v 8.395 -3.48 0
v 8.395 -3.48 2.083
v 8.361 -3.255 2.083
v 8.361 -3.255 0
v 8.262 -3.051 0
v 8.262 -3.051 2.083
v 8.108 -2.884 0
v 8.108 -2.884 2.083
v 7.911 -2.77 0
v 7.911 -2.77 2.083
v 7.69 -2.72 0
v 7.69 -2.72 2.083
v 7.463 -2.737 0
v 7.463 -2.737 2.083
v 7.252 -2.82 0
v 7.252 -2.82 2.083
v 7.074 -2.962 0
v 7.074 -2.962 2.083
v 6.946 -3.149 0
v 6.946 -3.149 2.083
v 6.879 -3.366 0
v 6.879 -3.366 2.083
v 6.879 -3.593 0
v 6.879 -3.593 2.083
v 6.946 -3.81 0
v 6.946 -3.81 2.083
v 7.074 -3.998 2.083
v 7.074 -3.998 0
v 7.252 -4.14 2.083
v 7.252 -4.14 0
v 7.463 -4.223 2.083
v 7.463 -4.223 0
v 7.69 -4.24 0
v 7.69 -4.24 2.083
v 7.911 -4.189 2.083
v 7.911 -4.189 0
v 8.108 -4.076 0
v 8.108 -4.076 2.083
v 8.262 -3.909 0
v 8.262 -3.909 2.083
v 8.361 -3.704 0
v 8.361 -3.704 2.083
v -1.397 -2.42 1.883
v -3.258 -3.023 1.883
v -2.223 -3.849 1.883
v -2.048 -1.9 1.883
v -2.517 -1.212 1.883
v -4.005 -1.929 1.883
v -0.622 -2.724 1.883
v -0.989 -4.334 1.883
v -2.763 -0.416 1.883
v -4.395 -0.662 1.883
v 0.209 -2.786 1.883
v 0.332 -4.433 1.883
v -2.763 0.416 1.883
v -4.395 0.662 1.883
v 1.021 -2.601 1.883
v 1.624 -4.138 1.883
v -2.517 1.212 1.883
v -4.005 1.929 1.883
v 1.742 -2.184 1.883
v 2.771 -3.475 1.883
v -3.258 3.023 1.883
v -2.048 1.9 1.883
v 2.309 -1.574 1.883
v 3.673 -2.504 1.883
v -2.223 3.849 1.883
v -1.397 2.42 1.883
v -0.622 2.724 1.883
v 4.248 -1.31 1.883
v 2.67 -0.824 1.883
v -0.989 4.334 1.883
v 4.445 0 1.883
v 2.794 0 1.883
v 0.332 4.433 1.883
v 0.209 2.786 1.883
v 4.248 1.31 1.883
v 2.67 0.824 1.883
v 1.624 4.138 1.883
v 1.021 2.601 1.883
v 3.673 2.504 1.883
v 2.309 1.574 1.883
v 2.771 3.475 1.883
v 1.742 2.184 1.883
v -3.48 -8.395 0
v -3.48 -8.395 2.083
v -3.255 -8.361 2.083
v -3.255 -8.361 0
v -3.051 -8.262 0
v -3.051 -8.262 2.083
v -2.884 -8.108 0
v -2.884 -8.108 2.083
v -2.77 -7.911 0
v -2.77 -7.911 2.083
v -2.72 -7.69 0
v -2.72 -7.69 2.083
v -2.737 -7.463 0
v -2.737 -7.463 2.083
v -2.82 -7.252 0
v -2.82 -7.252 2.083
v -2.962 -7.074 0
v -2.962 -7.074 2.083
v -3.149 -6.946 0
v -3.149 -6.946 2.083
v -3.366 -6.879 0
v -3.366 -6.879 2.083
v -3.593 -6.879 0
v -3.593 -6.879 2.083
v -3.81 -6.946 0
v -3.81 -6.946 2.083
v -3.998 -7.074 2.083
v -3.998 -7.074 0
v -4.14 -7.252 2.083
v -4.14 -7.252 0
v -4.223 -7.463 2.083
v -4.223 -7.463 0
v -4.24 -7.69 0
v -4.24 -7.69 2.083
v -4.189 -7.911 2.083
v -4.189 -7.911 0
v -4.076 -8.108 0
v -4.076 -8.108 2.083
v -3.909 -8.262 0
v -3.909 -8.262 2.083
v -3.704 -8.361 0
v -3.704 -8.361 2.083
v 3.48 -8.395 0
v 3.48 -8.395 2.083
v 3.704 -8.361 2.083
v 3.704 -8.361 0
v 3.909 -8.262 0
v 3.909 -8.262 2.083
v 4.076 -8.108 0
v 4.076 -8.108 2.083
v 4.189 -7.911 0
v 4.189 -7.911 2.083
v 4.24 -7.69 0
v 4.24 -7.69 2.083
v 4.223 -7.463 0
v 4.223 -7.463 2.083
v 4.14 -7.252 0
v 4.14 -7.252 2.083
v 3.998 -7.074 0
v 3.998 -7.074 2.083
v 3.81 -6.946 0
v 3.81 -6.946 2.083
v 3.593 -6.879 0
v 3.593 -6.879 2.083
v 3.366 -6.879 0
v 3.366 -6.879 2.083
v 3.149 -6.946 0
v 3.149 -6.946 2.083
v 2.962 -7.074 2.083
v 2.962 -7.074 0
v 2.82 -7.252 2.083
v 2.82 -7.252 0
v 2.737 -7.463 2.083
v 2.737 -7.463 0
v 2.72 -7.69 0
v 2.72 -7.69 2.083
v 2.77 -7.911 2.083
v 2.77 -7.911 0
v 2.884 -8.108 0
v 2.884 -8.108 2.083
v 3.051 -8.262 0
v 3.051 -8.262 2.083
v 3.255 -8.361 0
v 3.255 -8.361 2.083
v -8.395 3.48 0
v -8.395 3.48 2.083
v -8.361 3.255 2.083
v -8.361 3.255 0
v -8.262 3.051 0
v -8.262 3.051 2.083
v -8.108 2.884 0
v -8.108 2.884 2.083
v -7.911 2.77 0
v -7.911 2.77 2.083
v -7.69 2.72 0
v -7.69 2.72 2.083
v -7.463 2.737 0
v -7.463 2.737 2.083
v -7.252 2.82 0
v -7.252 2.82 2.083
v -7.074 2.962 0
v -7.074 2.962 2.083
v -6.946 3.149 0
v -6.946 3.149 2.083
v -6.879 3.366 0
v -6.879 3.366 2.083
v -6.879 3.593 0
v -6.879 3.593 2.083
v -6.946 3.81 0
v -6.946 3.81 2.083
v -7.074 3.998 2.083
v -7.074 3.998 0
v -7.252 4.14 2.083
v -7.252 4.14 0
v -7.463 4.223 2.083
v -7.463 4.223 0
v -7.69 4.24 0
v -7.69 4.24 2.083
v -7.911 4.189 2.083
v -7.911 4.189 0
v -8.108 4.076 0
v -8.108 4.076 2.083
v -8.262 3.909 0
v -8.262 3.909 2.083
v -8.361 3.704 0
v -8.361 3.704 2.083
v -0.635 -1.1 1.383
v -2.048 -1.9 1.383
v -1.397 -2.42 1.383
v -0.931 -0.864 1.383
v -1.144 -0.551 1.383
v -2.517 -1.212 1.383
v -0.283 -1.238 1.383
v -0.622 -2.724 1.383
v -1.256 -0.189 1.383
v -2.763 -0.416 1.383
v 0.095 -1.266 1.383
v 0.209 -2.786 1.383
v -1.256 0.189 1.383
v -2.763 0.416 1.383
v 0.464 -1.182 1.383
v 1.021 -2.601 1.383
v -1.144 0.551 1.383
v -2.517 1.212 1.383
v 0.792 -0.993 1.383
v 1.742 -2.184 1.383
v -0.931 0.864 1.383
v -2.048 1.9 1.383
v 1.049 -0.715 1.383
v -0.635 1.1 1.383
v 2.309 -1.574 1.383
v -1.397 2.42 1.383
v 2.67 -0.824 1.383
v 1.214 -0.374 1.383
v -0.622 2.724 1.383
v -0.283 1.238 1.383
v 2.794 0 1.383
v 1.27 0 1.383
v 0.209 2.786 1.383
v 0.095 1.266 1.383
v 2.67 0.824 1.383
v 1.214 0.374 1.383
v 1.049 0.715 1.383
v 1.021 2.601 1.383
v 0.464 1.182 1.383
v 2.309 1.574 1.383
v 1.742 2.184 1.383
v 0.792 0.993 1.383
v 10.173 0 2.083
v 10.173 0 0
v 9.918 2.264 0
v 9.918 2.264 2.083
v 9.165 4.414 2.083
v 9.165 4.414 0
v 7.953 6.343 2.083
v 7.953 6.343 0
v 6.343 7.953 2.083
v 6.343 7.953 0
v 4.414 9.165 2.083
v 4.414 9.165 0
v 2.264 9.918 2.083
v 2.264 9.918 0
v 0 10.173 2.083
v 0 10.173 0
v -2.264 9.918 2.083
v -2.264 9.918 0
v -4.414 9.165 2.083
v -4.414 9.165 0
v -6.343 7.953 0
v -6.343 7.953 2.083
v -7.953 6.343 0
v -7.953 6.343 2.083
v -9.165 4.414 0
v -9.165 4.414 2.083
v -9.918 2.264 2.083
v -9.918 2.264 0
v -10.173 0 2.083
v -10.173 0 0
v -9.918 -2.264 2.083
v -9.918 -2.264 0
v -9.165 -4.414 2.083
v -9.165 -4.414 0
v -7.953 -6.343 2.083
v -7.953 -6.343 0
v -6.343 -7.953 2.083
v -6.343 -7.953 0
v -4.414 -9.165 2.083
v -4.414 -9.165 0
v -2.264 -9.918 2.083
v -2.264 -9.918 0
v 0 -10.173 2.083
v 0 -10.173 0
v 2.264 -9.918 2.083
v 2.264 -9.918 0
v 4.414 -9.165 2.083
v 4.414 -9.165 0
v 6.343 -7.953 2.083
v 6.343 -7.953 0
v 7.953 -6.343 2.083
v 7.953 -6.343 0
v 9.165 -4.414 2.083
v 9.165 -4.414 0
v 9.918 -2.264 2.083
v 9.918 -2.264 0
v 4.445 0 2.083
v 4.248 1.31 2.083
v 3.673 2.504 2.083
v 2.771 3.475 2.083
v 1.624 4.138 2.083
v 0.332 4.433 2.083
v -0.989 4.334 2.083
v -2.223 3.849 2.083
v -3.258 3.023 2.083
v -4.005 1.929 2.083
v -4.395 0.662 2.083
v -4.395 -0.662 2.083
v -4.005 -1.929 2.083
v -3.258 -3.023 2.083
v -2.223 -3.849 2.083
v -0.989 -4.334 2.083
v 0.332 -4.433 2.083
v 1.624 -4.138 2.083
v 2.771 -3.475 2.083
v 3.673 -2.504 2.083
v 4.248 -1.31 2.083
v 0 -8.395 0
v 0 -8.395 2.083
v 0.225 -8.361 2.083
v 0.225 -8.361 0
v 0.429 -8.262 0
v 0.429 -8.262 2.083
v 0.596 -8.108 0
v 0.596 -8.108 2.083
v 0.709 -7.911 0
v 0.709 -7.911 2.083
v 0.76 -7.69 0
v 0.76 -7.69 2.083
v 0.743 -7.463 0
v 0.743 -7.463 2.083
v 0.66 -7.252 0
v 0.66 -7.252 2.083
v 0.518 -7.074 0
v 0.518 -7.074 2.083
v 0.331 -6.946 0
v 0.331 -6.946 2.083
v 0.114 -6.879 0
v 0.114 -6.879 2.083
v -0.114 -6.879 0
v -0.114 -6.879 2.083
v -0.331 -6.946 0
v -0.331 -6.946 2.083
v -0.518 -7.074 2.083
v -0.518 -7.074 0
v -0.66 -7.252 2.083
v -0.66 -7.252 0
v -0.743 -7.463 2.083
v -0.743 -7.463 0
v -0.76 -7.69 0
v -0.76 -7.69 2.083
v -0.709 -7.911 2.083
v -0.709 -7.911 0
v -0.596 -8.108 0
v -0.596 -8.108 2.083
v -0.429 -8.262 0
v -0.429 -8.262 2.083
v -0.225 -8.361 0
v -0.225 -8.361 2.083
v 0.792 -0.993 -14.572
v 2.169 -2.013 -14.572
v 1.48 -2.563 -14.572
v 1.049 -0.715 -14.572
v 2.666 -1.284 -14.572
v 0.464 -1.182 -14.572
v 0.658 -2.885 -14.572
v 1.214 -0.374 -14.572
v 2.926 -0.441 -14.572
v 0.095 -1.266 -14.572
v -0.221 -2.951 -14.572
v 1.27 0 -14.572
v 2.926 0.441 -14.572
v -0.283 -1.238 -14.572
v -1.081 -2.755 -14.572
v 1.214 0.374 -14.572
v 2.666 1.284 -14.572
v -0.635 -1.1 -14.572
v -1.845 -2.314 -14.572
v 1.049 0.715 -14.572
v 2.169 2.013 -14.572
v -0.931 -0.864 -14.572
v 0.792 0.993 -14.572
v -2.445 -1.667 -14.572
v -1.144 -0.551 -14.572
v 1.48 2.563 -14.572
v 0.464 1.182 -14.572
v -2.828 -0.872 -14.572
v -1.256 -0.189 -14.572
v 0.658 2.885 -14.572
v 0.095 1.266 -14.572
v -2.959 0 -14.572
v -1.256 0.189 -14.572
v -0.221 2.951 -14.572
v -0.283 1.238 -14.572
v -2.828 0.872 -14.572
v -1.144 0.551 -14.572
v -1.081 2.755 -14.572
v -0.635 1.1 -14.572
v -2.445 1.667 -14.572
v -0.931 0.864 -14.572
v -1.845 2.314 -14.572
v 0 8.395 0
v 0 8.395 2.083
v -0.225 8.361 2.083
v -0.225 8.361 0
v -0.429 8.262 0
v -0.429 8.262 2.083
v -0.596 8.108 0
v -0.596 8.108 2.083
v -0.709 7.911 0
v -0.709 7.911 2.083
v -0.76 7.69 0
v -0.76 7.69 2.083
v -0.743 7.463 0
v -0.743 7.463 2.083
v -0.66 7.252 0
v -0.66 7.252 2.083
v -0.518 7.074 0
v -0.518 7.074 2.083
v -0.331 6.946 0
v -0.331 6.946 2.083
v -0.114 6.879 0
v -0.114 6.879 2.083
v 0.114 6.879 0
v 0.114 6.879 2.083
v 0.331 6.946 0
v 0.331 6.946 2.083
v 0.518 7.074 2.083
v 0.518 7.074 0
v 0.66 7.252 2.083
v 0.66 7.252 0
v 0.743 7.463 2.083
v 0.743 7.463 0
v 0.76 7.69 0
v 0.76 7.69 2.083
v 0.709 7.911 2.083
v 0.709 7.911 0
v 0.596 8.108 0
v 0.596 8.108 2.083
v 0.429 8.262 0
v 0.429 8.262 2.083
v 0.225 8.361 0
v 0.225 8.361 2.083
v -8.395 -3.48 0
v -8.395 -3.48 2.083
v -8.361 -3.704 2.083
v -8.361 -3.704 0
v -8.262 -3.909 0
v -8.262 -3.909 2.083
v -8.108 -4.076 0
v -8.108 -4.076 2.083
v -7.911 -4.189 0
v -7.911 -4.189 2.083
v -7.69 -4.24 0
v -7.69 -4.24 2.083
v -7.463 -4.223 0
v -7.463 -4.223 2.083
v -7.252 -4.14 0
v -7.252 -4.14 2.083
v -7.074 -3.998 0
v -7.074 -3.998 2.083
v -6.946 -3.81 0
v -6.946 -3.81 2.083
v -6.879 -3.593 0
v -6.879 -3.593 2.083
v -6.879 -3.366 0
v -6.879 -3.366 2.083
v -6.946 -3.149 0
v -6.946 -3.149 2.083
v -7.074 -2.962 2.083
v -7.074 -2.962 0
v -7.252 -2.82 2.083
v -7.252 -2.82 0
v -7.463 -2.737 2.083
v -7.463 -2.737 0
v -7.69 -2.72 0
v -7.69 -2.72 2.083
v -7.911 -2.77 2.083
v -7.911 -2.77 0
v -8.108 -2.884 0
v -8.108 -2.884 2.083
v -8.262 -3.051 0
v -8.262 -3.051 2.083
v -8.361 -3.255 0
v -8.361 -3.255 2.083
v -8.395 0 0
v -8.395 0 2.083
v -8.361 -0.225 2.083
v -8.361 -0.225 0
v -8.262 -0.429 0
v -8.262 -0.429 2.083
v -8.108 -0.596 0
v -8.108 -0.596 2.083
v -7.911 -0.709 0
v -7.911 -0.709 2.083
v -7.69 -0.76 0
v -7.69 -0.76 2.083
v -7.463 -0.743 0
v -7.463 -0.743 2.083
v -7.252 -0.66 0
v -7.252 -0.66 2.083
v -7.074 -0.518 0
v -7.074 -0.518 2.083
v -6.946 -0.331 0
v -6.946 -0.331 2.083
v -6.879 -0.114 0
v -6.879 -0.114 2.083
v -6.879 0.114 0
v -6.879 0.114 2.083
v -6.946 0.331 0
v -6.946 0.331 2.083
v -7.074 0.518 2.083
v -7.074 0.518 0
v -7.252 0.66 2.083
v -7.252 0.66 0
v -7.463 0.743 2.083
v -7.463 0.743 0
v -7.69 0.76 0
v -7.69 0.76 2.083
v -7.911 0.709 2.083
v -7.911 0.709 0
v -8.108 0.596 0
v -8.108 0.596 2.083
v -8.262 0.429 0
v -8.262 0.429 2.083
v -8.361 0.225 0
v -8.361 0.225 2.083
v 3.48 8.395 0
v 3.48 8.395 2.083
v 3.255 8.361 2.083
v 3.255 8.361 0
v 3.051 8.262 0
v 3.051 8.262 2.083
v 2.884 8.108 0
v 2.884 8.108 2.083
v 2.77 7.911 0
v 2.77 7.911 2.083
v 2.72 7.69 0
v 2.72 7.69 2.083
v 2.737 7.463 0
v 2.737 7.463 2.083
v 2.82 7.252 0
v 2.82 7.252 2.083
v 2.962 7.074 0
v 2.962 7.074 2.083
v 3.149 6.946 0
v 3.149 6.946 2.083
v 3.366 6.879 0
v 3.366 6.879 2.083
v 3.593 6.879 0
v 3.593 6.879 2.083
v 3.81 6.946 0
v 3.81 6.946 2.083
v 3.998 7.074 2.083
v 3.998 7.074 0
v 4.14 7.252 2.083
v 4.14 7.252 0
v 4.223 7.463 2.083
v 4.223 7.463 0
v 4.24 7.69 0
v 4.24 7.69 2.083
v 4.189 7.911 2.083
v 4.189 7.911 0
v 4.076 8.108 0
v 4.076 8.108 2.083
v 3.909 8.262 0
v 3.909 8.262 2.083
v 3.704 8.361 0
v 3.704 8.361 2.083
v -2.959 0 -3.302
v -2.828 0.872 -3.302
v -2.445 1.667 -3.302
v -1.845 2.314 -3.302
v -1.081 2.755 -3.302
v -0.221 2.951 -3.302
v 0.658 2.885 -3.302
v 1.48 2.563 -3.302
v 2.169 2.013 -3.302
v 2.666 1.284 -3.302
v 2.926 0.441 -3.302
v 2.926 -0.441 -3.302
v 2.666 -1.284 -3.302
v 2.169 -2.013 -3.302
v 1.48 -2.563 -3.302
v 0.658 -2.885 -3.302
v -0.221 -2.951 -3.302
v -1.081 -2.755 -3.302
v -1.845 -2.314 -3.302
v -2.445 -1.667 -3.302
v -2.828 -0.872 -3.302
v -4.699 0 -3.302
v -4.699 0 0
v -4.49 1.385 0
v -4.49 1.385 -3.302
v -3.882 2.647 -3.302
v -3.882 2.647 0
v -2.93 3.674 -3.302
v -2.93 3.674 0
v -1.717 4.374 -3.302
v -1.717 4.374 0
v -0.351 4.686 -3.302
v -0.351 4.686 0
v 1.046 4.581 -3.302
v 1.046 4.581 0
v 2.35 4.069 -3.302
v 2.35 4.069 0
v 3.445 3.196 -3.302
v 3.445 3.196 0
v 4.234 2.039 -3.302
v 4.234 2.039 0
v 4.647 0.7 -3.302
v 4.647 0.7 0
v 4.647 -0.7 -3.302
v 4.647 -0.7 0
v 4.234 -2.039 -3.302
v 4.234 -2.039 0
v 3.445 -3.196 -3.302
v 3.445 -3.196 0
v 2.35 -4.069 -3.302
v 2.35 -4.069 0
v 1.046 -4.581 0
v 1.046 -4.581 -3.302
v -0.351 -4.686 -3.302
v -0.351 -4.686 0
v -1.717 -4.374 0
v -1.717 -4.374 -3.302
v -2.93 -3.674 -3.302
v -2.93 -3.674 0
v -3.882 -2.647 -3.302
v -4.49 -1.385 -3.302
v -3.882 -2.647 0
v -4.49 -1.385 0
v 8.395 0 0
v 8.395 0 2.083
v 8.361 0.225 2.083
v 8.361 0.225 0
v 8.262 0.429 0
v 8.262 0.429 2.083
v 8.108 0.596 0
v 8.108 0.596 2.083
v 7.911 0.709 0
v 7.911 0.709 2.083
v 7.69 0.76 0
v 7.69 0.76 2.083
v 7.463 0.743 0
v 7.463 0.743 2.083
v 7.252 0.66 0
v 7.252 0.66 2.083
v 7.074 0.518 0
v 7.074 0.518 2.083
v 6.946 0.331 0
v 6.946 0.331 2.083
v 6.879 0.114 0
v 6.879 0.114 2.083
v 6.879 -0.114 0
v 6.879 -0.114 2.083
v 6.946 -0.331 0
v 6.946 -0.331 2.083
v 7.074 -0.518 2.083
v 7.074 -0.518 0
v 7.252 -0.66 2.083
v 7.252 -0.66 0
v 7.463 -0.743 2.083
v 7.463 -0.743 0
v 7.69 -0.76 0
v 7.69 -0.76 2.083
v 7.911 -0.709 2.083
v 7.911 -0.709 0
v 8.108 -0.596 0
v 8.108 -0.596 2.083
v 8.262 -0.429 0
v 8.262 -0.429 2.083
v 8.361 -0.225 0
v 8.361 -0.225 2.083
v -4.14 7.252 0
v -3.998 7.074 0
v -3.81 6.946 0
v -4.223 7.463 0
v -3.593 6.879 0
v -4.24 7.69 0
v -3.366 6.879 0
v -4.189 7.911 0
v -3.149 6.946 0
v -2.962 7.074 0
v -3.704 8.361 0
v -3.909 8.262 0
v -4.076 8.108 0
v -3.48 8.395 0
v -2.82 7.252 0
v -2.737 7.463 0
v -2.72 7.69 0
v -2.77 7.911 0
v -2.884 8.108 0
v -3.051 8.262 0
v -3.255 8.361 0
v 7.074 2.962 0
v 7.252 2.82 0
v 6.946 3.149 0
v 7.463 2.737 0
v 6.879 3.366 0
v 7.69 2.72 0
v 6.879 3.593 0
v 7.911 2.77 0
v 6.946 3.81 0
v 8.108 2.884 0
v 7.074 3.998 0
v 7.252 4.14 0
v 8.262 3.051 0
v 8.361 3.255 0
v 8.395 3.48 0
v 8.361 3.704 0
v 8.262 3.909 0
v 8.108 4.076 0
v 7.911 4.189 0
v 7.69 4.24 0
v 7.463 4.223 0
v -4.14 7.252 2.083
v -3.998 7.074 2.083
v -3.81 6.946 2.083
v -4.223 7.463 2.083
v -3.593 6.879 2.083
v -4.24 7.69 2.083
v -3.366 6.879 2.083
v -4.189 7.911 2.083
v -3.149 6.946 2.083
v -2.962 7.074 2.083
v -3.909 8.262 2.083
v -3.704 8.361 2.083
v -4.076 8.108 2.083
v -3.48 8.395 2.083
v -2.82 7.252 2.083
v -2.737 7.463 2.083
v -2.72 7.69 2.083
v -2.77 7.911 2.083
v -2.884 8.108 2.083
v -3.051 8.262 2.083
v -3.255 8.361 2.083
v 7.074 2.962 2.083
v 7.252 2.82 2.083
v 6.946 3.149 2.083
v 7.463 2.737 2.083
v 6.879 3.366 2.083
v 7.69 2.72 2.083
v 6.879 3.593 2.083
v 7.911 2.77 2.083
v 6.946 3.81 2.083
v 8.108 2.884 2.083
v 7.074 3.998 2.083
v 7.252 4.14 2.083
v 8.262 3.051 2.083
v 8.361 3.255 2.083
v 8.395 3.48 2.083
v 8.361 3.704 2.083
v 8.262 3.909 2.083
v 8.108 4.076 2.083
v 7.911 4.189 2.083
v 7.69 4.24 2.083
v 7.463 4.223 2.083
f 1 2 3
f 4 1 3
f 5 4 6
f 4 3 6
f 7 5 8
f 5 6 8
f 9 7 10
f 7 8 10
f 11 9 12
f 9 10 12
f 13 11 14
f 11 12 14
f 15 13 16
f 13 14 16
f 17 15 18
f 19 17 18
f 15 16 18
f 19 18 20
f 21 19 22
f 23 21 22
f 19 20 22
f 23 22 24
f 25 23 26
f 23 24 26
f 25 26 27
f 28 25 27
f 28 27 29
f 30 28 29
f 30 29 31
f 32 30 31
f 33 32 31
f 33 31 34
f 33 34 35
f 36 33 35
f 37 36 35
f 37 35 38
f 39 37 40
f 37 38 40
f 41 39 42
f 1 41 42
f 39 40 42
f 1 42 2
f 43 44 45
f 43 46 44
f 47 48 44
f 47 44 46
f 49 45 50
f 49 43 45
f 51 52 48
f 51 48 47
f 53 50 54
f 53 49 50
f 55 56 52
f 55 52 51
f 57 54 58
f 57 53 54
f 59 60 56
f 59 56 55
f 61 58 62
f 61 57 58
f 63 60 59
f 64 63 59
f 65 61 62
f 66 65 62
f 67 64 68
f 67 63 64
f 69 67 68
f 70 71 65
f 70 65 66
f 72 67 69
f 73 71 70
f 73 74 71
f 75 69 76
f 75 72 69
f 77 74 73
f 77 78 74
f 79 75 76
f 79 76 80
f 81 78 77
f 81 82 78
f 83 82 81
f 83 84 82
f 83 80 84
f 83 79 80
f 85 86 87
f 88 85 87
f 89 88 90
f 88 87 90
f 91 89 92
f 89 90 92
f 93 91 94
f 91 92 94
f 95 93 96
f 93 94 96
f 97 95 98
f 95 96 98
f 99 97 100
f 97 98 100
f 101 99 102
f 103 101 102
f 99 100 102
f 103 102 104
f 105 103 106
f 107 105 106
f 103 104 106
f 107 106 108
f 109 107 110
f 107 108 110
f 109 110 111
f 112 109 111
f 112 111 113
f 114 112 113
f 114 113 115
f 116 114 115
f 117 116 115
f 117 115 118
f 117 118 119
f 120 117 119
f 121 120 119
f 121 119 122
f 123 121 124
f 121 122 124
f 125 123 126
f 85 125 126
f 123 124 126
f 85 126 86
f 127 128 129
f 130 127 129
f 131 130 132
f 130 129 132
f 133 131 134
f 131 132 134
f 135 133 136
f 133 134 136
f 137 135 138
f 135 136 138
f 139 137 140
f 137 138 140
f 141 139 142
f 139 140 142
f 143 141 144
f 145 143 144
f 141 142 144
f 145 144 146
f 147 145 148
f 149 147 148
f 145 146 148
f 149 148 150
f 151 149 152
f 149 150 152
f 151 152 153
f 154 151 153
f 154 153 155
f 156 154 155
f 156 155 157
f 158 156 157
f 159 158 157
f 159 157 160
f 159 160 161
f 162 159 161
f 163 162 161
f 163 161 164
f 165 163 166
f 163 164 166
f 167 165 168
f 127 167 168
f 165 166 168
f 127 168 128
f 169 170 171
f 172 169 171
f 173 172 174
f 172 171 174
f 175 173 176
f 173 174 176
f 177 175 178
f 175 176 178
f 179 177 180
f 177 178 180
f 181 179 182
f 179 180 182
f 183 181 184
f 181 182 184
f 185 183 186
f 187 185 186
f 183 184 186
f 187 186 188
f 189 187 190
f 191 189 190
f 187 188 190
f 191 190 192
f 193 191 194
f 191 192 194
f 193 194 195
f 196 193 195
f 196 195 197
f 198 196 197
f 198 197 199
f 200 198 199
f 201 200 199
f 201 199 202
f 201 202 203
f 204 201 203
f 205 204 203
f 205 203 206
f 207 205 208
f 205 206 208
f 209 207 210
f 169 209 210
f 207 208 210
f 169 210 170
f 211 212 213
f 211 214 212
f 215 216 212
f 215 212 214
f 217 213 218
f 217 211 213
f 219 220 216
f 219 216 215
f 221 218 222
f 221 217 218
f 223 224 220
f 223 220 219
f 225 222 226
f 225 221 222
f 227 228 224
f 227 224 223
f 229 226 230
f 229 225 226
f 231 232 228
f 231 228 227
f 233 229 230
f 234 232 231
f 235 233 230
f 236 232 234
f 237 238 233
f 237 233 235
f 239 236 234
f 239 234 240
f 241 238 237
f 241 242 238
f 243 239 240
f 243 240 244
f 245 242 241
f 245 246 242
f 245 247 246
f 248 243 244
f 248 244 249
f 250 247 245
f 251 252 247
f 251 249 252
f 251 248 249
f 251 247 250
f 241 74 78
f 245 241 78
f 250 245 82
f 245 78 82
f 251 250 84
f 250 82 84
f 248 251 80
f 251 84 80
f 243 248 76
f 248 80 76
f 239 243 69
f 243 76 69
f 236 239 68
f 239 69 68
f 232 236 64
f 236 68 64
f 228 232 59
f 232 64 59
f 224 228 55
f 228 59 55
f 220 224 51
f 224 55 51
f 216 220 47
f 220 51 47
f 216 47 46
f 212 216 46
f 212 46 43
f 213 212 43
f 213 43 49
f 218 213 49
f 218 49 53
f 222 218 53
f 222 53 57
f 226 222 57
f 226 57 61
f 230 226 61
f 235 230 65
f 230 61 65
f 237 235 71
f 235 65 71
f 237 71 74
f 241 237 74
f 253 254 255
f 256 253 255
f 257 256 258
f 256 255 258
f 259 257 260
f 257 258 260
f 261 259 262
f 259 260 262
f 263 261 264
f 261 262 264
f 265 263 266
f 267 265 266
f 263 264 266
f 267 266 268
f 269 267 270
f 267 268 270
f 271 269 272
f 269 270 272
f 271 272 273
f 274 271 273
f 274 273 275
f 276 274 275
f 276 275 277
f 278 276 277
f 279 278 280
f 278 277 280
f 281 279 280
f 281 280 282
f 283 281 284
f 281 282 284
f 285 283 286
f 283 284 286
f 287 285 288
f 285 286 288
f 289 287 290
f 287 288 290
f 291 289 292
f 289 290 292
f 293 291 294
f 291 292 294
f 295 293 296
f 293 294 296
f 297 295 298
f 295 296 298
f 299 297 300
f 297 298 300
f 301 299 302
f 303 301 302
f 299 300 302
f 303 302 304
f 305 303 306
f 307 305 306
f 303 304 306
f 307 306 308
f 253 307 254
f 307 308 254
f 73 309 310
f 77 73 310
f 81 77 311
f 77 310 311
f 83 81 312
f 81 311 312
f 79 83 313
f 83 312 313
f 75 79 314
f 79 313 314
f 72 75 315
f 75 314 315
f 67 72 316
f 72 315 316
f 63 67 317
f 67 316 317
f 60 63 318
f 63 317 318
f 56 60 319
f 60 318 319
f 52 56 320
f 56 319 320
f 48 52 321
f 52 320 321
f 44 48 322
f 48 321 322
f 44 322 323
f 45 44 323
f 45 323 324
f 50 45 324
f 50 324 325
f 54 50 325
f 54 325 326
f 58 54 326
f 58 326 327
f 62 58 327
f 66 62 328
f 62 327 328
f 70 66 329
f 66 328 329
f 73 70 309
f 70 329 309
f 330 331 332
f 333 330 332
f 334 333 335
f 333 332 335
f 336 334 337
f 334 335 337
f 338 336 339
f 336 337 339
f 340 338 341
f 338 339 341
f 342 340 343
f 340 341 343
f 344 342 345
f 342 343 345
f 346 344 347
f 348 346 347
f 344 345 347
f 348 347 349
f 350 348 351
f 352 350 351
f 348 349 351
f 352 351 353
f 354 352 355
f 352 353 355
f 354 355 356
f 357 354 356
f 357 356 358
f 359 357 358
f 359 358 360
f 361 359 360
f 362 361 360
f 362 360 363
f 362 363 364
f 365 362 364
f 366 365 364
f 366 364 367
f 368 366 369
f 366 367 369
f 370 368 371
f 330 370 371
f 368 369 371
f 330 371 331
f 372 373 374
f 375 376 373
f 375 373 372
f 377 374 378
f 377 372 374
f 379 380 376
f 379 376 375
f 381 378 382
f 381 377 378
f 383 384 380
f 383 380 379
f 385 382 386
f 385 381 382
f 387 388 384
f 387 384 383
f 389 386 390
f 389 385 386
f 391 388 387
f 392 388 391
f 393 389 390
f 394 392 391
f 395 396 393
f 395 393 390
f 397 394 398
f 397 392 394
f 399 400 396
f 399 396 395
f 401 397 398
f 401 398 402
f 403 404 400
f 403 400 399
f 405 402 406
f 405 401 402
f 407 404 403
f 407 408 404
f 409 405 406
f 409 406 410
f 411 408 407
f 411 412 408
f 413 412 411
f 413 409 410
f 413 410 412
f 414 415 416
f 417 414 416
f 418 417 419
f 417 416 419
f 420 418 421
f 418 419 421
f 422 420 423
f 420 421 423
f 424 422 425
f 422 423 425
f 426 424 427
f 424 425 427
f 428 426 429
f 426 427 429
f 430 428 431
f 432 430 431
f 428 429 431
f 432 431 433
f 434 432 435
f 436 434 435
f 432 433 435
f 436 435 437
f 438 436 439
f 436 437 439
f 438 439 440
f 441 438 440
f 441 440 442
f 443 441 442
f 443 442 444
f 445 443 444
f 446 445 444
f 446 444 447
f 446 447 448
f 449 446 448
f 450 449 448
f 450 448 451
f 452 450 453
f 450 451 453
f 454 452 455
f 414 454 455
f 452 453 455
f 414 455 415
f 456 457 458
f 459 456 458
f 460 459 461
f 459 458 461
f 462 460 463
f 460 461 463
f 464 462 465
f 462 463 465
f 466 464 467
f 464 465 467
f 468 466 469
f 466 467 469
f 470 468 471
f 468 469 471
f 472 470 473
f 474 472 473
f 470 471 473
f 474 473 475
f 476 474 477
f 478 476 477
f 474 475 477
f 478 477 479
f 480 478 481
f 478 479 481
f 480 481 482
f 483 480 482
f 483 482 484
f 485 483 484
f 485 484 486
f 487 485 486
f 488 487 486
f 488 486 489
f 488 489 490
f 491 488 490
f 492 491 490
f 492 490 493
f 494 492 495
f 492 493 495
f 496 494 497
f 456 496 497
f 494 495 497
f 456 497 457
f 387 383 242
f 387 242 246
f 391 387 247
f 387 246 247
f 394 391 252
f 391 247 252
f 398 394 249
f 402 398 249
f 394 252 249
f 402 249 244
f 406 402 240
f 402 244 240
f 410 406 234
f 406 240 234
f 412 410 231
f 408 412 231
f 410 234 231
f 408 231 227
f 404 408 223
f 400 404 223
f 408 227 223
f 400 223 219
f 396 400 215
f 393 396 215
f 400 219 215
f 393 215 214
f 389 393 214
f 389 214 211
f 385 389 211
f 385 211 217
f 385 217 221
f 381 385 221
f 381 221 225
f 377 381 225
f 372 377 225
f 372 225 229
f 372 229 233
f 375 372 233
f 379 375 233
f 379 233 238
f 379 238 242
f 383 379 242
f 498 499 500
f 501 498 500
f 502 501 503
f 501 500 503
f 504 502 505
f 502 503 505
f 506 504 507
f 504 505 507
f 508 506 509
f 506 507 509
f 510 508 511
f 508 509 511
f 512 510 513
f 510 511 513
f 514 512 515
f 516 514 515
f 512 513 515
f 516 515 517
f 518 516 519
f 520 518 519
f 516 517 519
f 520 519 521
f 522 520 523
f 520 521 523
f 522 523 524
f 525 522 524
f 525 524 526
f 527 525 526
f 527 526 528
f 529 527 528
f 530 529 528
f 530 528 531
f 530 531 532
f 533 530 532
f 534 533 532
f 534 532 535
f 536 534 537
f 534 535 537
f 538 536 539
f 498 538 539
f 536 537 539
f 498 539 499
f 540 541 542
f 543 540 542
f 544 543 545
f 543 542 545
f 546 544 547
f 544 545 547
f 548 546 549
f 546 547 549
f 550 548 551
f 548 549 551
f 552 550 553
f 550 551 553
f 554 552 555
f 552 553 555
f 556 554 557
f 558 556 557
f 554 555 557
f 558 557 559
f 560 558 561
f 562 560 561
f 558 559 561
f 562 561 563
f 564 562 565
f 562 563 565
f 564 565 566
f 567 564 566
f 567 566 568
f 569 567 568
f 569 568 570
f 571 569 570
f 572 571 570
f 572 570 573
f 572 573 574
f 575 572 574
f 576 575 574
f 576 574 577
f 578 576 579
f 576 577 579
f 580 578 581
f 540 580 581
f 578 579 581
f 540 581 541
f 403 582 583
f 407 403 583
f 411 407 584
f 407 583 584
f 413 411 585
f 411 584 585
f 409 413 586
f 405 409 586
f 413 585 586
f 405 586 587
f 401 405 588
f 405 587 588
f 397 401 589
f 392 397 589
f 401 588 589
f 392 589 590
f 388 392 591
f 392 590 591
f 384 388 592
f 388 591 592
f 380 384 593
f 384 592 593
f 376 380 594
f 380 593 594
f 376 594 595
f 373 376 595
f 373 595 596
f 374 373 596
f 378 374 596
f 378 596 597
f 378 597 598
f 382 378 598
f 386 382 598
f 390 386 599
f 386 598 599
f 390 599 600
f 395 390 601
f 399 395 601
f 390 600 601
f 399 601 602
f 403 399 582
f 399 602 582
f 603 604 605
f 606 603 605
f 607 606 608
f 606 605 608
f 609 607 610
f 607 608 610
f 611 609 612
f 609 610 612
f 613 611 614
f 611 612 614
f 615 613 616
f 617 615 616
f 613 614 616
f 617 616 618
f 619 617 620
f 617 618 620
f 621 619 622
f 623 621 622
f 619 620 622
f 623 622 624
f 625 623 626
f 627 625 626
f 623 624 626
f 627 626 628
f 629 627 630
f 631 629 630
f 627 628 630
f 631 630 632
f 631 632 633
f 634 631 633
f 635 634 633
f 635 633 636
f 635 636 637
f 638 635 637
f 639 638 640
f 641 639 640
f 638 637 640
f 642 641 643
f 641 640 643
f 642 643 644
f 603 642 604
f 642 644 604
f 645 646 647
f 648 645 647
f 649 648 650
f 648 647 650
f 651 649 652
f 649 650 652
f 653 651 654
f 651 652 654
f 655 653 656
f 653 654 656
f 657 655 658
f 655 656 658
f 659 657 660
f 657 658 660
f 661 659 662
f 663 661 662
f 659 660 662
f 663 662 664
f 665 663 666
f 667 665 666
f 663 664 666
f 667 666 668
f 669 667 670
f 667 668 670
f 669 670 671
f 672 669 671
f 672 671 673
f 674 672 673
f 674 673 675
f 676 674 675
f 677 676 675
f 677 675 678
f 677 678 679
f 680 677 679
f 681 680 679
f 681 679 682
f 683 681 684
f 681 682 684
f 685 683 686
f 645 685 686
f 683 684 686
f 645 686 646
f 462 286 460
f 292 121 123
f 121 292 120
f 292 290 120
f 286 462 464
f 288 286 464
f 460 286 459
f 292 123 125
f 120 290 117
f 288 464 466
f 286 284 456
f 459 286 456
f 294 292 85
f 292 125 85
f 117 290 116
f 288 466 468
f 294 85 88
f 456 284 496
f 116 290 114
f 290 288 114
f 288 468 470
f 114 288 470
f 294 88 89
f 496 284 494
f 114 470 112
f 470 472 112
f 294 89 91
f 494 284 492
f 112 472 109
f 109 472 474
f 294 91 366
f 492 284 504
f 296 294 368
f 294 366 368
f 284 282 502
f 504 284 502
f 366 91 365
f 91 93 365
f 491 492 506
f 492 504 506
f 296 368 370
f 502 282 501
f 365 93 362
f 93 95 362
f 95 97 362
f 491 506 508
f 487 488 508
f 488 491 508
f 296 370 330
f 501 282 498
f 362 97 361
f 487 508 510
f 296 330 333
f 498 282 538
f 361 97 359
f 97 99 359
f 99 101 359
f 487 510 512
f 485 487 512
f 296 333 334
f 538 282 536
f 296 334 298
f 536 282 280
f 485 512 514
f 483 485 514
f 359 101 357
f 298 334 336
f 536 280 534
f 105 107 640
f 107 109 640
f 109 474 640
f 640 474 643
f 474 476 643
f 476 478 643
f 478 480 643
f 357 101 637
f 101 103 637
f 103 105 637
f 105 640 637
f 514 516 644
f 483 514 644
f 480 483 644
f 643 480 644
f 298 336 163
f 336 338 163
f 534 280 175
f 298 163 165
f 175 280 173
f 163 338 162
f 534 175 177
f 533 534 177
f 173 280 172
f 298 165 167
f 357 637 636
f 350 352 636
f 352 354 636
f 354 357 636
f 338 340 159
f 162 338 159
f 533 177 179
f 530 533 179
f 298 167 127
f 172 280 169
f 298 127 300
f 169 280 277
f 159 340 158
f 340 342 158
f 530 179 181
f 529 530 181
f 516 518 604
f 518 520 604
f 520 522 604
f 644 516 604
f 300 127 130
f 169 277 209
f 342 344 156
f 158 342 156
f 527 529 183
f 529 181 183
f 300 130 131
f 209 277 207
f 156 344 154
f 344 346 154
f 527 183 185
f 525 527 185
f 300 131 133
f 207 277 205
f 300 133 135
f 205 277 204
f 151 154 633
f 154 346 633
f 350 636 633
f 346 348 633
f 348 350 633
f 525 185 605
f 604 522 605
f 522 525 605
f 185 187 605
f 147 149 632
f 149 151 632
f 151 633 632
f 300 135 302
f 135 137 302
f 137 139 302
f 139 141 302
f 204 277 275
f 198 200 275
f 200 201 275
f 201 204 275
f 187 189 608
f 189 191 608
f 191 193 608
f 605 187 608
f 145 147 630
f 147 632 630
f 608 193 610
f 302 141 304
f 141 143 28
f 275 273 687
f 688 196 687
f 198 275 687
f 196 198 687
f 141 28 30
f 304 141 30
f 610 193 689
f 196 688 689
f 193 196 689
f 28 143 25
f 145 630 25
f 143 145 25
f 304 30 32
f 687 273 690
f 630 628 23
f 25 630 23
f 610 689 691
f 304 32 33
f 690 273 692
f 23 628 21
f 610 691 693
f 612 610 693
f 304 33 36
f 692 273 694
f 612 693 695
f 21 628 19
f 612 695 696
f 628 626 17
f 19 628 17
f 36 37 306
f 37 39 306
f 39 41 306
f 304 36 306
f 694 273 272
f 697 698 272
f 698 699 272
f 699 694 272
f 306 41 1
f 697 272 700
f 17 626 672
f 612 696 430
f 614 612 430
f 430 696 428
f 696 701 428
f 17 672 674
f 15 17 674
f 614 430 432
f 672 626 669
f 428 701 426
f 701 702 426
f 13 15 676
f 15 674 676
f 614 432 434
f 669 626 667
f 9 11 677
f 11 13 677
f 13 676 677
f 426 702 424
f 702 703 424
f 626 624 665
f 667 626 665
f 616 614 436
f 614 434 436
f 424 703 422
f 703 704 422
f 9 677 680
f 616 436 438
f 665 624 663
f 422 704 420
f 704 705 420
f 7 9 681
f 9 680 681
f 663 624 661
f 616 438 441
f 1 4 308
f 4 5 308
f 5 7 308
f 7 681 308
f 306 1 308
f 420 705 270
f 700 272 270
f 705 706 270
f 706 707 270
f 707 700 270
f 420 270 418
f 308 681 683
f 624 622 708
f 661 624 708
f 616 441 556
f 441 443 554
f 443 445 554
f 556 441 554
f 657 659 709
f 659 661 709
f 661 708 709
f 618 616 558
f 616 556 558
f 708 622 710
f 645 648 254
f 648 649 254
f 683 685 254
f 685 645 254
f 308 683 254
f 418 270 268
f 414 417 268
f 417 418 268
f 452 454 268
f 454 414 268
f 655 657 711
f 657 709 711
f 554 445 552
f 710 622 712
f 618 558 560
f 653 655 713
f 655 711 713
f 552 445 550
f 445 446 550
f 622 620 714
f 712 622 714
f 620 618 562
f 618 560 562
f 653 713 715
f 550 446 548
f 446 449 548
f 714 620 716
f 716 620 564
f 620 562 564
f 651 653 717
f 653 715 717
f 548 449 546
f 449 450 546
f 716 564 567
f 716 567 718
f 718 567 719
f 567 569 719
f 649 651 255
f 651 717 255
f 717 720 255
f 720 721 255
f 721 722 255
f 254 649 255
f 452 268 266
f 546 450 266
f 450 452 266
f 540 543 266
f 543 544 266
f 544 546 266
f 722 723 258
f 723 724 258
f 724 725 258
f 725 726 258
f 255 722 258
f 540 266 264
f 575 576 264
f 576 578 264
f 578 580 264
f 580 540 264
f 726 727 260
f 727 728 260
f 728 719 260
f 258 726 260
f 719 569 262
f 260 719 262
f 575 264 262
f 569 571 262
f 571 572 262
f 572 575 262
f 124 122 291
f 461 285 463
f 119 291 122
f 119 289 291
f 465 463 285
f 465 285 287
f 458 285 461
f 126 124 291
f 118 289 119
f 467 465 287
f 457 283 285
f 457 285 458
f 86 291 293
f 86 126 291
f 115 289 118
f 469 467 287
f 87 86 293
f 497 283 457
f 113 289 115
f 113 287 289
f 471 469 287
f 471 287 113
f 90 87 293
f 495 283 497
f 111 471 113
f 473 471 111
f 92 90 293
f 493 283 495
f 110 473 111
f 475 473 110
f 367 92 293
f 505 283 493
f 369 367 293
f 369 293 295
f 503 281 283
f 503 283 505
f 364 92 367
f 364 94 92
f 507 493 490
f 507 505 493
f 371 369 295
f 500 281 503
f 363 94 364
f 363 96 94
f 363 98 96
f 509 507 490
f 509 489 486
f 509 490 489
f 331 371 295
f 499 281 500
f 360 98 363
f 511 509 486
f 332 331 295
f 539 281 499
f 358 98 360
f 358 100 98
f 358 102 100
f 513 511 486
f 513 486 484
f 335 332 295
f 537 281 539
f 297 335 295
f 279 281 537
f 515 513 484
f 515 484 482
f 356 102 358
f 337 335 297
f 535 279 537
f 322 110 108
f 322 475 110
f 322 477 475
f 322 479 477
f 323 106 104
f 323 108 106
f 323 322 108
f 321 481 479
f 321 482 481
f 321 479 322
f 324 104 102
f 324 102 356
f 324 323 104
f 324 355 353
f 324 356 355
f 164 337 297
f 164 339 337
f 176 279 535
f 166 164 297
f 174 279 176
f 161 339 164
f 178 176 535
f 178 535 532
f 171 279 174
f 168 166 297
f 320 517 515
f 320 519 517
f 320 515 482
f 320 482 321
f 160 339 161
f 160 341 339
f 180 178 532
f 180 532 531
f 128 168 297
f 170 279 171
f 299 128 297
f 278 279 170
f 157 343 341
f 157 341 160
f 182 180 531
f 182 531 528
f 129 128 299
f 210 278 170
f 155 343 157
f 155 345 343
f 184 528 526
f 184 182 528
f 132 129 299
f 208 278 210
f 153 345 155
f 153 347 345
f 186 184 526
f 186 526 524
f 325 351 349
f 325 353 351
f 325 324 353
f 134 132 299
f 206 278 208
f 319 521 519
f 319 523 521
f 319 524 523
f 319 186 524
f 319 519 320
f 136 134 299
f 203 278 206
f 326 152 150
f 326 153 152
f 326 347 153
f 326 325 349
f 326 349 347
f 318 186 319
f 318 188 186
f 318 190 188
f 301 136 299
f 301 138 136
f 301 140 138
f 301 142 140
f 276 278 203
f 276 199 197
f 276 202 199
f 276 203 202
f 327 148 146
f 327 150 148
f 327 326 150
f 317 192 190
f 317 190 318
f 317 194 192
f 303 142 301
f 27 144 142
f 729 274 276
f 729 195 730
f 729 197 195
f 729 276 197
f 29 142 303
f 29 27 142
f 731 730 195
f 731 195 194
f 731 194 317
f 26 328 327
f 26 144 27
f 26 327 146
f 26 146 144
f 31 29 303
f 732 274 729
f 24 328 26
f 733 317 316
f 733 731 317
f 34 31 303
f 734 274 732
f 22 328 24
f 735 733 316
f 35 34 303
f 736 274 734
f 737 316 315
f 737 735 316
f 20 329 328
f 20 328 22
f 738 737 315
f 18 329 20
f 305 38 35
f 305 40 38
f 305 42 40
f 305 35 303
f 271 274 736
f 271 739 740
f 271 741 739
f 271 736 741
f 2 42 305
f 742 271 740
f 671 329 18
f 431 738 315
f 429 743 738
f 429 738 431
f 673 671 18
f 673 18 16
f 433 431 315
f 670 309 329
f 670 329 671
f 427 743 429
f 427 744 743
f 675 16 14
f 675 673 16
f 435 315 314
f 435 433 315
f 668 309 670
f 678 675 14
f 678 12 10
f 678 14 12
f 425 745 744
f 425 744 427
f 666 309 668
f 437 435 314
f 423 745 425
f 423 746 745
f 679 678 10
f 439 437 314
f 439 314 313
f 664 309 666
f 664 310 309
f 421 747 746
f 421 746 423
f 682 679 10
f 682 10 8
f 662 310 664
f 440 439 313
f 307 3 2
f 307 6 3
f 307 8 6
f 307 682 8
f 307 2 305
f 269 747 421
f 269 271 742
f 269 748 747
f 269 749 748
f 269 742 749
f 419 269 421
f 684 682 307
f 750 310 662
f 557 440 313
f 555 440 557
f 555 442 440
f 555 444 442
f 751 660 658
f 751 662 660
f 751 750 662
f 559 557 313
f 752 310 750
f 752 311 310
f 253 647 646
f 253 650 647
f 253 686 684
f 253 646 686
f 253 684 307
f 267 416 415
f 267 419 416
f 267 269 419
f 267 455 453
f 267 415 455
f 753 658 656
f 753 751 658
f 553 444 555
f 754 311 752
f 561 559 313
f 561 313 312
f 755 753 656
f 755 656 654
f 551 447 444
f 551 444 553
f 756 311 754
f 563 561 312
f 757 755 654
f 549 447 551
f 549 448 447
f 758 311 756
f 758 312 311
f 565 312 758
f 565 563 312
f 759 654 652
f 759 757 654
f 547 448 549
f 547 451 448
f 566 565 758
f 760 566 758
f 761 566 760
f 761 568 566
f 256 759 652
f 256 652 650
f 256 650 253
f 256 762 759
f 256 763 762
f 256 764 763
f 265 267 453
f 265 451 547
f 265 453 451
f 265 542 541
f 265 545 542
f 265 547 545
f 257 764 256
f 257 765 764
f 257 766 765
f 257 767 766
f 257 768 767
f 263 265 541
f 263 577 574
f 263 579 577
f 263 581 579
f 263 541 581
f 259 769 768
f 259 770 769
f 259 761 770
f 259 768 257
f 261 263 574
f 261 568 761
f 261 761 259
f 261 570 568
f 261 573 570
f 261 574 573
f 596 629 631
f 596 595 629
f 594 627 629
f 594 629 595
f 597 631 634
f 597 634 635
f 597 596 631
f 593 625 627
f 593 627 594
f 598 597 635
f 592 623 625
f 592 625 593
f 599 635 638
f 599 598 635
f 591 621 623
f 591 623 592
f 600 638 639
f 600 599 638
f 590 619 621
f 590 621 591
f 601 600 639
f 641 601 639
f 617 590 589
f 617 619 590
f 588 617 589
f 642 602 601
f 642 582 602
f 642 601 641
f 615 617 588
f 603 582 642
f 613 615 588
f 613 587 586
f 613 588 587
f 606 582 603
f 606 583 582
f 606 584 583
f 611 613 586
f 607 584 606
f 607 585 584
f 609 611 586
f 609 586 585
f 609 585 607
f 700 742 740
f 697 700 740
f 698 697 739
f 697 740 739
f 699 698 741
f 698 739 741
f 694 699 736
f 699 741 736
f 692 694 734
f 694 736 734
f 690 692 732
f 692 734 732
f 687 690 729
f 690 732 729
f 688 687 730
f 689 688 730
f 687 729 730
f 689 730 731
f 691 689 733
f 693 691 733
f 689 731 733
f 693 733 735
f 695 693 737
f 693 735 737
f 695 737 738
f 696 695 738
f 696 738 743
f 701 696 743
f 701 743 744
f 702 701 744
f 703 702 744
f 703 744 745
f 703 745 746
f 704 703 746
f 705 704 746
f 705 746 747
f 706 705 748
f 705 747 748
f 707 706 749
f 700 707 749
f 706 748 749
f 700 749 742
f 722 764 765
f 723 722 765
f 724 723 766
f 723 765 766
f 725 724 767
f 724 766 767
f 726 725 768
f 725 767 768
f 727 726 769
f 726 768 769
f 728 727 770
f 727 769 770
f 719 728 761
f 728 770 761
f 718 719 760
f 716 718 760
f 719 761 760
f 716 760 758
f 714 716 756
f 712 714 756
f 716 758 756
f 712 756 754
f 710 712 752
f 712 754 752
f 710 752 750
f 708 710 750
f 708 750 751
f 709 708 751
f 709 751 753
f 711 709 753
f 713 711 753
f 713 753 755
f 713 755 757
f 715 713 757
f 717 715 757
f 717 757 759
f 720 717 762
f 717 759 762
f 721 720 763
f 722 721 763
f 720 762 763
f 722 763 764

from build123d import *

# Parameters (mm, degrees)
SKETCH1_R          = 10.1727
EXTRUDE1_DEPTH     = 2.0828
SKETCH2_R          = 4.699
EXTRUDE2_DEPTH     = 3.302
SKETCH3_R          = 2.9591
EXTRUDE3_DEPTH     = 11.27
SKETCH4_R          = 4.445
CUT_EXTRUDE1_DEPTH = 0.2
SKETCH6_R          = 2.794
CUT_EXTRUDE2_DEPTH = 0.5
SKETCH7_R          = 1.27
CUT_EXTRUDE3_DEPTH = 16.9548
SKETCH8_R          = 0.762
CUT_EXTRUDE4_DEPTH = 2.0828
CIRPATTERN1_COUNT  = 4


with BuildPart() as part:
    # Sketch1 → Extrude1 (new body)
    with BuildSketch(Plane.XY):
        Circle(SKETCH1_R)
    extrude(amount=EXTRUDE1_DEPTH)

    # Sketch2 → Extrude2 (add)
    with BuildSketch(Plane(origin=(0, 0, 0), x_dir=(-1, 0, 0), z_dir=(0, 0, -1))):
        Circle(SKETCH2_R)
    extrude(amount=EXTRUDE2_DEPTH)

    # Sketch3 → Extrude3 (add)
    with BuildSketch(Plane(origin=(0, 0, -3.302), x_dir=(-1, 0, 0), z_dir=(0, 0, -1))):
        Circle(SKETCH3_R)
    extrude(amount=EXTRUDE3_DEPTH)

    # Sketch4 → Cut-Extrude1 (cut)
    with BuildSketch(Plane.XY.offset(2.0828)):
        Circle(SKETCH4_R)
    extrude(amount=-CUT_EXTRUDE1_DEPTH, mode=Mode.SUBTRACT)

    # Sketch6 → Cut-Extrude2 (cut)
    with BuildSketch(Plane.XY.offset(1.8828)):
        Circle(SKETCH6_R)
    extrude(amount=-CUT_EXTRUDE2_DEPTH, mode=Mode.SUBTRACT)

    # Sketch7 → Cut-Extrude3 (cut, through all)
    with BuildSketch(Plane.XY.offset(1.3828)):
        Circle(SKETCH7_R)
    extrude(amount=-CUT_EXTRUDE3_DEPTH, mode=Mode.SUBTRACT)

    # Sketch8 → Cut-Extrude4 (cut)
    with BuildSketch(Plane.XY.offset(2.0828)):
        with Locations((7.6327, 0)):
            Circle(SKETCH8_R)
        with Locations((7.6327, -3.4798)):
            Circle(SKETCH8_R)
        with Locations((7.6327, 3.4798)):
            Circle(SKETCH8_R)
    cut_extrude4 = extrude(amount=-CUT_EXTRUDE4_DEPTH, mode=Mode.SUBTRACT)

    # CirPattern1: Cut-Extrude4 ×4 about axis
    cirpattern1_axis = Axis((0, 0, 0), (0, 0, 1))
    for i in range(1, CIRPATTERN1_COUNT):
        add(cut_extrude4.rotate(cirpattern1_axis, i * 360 / CIRPATTERN1_COUNT), mode=Mode.SUBTRACT)


solid = part.part
